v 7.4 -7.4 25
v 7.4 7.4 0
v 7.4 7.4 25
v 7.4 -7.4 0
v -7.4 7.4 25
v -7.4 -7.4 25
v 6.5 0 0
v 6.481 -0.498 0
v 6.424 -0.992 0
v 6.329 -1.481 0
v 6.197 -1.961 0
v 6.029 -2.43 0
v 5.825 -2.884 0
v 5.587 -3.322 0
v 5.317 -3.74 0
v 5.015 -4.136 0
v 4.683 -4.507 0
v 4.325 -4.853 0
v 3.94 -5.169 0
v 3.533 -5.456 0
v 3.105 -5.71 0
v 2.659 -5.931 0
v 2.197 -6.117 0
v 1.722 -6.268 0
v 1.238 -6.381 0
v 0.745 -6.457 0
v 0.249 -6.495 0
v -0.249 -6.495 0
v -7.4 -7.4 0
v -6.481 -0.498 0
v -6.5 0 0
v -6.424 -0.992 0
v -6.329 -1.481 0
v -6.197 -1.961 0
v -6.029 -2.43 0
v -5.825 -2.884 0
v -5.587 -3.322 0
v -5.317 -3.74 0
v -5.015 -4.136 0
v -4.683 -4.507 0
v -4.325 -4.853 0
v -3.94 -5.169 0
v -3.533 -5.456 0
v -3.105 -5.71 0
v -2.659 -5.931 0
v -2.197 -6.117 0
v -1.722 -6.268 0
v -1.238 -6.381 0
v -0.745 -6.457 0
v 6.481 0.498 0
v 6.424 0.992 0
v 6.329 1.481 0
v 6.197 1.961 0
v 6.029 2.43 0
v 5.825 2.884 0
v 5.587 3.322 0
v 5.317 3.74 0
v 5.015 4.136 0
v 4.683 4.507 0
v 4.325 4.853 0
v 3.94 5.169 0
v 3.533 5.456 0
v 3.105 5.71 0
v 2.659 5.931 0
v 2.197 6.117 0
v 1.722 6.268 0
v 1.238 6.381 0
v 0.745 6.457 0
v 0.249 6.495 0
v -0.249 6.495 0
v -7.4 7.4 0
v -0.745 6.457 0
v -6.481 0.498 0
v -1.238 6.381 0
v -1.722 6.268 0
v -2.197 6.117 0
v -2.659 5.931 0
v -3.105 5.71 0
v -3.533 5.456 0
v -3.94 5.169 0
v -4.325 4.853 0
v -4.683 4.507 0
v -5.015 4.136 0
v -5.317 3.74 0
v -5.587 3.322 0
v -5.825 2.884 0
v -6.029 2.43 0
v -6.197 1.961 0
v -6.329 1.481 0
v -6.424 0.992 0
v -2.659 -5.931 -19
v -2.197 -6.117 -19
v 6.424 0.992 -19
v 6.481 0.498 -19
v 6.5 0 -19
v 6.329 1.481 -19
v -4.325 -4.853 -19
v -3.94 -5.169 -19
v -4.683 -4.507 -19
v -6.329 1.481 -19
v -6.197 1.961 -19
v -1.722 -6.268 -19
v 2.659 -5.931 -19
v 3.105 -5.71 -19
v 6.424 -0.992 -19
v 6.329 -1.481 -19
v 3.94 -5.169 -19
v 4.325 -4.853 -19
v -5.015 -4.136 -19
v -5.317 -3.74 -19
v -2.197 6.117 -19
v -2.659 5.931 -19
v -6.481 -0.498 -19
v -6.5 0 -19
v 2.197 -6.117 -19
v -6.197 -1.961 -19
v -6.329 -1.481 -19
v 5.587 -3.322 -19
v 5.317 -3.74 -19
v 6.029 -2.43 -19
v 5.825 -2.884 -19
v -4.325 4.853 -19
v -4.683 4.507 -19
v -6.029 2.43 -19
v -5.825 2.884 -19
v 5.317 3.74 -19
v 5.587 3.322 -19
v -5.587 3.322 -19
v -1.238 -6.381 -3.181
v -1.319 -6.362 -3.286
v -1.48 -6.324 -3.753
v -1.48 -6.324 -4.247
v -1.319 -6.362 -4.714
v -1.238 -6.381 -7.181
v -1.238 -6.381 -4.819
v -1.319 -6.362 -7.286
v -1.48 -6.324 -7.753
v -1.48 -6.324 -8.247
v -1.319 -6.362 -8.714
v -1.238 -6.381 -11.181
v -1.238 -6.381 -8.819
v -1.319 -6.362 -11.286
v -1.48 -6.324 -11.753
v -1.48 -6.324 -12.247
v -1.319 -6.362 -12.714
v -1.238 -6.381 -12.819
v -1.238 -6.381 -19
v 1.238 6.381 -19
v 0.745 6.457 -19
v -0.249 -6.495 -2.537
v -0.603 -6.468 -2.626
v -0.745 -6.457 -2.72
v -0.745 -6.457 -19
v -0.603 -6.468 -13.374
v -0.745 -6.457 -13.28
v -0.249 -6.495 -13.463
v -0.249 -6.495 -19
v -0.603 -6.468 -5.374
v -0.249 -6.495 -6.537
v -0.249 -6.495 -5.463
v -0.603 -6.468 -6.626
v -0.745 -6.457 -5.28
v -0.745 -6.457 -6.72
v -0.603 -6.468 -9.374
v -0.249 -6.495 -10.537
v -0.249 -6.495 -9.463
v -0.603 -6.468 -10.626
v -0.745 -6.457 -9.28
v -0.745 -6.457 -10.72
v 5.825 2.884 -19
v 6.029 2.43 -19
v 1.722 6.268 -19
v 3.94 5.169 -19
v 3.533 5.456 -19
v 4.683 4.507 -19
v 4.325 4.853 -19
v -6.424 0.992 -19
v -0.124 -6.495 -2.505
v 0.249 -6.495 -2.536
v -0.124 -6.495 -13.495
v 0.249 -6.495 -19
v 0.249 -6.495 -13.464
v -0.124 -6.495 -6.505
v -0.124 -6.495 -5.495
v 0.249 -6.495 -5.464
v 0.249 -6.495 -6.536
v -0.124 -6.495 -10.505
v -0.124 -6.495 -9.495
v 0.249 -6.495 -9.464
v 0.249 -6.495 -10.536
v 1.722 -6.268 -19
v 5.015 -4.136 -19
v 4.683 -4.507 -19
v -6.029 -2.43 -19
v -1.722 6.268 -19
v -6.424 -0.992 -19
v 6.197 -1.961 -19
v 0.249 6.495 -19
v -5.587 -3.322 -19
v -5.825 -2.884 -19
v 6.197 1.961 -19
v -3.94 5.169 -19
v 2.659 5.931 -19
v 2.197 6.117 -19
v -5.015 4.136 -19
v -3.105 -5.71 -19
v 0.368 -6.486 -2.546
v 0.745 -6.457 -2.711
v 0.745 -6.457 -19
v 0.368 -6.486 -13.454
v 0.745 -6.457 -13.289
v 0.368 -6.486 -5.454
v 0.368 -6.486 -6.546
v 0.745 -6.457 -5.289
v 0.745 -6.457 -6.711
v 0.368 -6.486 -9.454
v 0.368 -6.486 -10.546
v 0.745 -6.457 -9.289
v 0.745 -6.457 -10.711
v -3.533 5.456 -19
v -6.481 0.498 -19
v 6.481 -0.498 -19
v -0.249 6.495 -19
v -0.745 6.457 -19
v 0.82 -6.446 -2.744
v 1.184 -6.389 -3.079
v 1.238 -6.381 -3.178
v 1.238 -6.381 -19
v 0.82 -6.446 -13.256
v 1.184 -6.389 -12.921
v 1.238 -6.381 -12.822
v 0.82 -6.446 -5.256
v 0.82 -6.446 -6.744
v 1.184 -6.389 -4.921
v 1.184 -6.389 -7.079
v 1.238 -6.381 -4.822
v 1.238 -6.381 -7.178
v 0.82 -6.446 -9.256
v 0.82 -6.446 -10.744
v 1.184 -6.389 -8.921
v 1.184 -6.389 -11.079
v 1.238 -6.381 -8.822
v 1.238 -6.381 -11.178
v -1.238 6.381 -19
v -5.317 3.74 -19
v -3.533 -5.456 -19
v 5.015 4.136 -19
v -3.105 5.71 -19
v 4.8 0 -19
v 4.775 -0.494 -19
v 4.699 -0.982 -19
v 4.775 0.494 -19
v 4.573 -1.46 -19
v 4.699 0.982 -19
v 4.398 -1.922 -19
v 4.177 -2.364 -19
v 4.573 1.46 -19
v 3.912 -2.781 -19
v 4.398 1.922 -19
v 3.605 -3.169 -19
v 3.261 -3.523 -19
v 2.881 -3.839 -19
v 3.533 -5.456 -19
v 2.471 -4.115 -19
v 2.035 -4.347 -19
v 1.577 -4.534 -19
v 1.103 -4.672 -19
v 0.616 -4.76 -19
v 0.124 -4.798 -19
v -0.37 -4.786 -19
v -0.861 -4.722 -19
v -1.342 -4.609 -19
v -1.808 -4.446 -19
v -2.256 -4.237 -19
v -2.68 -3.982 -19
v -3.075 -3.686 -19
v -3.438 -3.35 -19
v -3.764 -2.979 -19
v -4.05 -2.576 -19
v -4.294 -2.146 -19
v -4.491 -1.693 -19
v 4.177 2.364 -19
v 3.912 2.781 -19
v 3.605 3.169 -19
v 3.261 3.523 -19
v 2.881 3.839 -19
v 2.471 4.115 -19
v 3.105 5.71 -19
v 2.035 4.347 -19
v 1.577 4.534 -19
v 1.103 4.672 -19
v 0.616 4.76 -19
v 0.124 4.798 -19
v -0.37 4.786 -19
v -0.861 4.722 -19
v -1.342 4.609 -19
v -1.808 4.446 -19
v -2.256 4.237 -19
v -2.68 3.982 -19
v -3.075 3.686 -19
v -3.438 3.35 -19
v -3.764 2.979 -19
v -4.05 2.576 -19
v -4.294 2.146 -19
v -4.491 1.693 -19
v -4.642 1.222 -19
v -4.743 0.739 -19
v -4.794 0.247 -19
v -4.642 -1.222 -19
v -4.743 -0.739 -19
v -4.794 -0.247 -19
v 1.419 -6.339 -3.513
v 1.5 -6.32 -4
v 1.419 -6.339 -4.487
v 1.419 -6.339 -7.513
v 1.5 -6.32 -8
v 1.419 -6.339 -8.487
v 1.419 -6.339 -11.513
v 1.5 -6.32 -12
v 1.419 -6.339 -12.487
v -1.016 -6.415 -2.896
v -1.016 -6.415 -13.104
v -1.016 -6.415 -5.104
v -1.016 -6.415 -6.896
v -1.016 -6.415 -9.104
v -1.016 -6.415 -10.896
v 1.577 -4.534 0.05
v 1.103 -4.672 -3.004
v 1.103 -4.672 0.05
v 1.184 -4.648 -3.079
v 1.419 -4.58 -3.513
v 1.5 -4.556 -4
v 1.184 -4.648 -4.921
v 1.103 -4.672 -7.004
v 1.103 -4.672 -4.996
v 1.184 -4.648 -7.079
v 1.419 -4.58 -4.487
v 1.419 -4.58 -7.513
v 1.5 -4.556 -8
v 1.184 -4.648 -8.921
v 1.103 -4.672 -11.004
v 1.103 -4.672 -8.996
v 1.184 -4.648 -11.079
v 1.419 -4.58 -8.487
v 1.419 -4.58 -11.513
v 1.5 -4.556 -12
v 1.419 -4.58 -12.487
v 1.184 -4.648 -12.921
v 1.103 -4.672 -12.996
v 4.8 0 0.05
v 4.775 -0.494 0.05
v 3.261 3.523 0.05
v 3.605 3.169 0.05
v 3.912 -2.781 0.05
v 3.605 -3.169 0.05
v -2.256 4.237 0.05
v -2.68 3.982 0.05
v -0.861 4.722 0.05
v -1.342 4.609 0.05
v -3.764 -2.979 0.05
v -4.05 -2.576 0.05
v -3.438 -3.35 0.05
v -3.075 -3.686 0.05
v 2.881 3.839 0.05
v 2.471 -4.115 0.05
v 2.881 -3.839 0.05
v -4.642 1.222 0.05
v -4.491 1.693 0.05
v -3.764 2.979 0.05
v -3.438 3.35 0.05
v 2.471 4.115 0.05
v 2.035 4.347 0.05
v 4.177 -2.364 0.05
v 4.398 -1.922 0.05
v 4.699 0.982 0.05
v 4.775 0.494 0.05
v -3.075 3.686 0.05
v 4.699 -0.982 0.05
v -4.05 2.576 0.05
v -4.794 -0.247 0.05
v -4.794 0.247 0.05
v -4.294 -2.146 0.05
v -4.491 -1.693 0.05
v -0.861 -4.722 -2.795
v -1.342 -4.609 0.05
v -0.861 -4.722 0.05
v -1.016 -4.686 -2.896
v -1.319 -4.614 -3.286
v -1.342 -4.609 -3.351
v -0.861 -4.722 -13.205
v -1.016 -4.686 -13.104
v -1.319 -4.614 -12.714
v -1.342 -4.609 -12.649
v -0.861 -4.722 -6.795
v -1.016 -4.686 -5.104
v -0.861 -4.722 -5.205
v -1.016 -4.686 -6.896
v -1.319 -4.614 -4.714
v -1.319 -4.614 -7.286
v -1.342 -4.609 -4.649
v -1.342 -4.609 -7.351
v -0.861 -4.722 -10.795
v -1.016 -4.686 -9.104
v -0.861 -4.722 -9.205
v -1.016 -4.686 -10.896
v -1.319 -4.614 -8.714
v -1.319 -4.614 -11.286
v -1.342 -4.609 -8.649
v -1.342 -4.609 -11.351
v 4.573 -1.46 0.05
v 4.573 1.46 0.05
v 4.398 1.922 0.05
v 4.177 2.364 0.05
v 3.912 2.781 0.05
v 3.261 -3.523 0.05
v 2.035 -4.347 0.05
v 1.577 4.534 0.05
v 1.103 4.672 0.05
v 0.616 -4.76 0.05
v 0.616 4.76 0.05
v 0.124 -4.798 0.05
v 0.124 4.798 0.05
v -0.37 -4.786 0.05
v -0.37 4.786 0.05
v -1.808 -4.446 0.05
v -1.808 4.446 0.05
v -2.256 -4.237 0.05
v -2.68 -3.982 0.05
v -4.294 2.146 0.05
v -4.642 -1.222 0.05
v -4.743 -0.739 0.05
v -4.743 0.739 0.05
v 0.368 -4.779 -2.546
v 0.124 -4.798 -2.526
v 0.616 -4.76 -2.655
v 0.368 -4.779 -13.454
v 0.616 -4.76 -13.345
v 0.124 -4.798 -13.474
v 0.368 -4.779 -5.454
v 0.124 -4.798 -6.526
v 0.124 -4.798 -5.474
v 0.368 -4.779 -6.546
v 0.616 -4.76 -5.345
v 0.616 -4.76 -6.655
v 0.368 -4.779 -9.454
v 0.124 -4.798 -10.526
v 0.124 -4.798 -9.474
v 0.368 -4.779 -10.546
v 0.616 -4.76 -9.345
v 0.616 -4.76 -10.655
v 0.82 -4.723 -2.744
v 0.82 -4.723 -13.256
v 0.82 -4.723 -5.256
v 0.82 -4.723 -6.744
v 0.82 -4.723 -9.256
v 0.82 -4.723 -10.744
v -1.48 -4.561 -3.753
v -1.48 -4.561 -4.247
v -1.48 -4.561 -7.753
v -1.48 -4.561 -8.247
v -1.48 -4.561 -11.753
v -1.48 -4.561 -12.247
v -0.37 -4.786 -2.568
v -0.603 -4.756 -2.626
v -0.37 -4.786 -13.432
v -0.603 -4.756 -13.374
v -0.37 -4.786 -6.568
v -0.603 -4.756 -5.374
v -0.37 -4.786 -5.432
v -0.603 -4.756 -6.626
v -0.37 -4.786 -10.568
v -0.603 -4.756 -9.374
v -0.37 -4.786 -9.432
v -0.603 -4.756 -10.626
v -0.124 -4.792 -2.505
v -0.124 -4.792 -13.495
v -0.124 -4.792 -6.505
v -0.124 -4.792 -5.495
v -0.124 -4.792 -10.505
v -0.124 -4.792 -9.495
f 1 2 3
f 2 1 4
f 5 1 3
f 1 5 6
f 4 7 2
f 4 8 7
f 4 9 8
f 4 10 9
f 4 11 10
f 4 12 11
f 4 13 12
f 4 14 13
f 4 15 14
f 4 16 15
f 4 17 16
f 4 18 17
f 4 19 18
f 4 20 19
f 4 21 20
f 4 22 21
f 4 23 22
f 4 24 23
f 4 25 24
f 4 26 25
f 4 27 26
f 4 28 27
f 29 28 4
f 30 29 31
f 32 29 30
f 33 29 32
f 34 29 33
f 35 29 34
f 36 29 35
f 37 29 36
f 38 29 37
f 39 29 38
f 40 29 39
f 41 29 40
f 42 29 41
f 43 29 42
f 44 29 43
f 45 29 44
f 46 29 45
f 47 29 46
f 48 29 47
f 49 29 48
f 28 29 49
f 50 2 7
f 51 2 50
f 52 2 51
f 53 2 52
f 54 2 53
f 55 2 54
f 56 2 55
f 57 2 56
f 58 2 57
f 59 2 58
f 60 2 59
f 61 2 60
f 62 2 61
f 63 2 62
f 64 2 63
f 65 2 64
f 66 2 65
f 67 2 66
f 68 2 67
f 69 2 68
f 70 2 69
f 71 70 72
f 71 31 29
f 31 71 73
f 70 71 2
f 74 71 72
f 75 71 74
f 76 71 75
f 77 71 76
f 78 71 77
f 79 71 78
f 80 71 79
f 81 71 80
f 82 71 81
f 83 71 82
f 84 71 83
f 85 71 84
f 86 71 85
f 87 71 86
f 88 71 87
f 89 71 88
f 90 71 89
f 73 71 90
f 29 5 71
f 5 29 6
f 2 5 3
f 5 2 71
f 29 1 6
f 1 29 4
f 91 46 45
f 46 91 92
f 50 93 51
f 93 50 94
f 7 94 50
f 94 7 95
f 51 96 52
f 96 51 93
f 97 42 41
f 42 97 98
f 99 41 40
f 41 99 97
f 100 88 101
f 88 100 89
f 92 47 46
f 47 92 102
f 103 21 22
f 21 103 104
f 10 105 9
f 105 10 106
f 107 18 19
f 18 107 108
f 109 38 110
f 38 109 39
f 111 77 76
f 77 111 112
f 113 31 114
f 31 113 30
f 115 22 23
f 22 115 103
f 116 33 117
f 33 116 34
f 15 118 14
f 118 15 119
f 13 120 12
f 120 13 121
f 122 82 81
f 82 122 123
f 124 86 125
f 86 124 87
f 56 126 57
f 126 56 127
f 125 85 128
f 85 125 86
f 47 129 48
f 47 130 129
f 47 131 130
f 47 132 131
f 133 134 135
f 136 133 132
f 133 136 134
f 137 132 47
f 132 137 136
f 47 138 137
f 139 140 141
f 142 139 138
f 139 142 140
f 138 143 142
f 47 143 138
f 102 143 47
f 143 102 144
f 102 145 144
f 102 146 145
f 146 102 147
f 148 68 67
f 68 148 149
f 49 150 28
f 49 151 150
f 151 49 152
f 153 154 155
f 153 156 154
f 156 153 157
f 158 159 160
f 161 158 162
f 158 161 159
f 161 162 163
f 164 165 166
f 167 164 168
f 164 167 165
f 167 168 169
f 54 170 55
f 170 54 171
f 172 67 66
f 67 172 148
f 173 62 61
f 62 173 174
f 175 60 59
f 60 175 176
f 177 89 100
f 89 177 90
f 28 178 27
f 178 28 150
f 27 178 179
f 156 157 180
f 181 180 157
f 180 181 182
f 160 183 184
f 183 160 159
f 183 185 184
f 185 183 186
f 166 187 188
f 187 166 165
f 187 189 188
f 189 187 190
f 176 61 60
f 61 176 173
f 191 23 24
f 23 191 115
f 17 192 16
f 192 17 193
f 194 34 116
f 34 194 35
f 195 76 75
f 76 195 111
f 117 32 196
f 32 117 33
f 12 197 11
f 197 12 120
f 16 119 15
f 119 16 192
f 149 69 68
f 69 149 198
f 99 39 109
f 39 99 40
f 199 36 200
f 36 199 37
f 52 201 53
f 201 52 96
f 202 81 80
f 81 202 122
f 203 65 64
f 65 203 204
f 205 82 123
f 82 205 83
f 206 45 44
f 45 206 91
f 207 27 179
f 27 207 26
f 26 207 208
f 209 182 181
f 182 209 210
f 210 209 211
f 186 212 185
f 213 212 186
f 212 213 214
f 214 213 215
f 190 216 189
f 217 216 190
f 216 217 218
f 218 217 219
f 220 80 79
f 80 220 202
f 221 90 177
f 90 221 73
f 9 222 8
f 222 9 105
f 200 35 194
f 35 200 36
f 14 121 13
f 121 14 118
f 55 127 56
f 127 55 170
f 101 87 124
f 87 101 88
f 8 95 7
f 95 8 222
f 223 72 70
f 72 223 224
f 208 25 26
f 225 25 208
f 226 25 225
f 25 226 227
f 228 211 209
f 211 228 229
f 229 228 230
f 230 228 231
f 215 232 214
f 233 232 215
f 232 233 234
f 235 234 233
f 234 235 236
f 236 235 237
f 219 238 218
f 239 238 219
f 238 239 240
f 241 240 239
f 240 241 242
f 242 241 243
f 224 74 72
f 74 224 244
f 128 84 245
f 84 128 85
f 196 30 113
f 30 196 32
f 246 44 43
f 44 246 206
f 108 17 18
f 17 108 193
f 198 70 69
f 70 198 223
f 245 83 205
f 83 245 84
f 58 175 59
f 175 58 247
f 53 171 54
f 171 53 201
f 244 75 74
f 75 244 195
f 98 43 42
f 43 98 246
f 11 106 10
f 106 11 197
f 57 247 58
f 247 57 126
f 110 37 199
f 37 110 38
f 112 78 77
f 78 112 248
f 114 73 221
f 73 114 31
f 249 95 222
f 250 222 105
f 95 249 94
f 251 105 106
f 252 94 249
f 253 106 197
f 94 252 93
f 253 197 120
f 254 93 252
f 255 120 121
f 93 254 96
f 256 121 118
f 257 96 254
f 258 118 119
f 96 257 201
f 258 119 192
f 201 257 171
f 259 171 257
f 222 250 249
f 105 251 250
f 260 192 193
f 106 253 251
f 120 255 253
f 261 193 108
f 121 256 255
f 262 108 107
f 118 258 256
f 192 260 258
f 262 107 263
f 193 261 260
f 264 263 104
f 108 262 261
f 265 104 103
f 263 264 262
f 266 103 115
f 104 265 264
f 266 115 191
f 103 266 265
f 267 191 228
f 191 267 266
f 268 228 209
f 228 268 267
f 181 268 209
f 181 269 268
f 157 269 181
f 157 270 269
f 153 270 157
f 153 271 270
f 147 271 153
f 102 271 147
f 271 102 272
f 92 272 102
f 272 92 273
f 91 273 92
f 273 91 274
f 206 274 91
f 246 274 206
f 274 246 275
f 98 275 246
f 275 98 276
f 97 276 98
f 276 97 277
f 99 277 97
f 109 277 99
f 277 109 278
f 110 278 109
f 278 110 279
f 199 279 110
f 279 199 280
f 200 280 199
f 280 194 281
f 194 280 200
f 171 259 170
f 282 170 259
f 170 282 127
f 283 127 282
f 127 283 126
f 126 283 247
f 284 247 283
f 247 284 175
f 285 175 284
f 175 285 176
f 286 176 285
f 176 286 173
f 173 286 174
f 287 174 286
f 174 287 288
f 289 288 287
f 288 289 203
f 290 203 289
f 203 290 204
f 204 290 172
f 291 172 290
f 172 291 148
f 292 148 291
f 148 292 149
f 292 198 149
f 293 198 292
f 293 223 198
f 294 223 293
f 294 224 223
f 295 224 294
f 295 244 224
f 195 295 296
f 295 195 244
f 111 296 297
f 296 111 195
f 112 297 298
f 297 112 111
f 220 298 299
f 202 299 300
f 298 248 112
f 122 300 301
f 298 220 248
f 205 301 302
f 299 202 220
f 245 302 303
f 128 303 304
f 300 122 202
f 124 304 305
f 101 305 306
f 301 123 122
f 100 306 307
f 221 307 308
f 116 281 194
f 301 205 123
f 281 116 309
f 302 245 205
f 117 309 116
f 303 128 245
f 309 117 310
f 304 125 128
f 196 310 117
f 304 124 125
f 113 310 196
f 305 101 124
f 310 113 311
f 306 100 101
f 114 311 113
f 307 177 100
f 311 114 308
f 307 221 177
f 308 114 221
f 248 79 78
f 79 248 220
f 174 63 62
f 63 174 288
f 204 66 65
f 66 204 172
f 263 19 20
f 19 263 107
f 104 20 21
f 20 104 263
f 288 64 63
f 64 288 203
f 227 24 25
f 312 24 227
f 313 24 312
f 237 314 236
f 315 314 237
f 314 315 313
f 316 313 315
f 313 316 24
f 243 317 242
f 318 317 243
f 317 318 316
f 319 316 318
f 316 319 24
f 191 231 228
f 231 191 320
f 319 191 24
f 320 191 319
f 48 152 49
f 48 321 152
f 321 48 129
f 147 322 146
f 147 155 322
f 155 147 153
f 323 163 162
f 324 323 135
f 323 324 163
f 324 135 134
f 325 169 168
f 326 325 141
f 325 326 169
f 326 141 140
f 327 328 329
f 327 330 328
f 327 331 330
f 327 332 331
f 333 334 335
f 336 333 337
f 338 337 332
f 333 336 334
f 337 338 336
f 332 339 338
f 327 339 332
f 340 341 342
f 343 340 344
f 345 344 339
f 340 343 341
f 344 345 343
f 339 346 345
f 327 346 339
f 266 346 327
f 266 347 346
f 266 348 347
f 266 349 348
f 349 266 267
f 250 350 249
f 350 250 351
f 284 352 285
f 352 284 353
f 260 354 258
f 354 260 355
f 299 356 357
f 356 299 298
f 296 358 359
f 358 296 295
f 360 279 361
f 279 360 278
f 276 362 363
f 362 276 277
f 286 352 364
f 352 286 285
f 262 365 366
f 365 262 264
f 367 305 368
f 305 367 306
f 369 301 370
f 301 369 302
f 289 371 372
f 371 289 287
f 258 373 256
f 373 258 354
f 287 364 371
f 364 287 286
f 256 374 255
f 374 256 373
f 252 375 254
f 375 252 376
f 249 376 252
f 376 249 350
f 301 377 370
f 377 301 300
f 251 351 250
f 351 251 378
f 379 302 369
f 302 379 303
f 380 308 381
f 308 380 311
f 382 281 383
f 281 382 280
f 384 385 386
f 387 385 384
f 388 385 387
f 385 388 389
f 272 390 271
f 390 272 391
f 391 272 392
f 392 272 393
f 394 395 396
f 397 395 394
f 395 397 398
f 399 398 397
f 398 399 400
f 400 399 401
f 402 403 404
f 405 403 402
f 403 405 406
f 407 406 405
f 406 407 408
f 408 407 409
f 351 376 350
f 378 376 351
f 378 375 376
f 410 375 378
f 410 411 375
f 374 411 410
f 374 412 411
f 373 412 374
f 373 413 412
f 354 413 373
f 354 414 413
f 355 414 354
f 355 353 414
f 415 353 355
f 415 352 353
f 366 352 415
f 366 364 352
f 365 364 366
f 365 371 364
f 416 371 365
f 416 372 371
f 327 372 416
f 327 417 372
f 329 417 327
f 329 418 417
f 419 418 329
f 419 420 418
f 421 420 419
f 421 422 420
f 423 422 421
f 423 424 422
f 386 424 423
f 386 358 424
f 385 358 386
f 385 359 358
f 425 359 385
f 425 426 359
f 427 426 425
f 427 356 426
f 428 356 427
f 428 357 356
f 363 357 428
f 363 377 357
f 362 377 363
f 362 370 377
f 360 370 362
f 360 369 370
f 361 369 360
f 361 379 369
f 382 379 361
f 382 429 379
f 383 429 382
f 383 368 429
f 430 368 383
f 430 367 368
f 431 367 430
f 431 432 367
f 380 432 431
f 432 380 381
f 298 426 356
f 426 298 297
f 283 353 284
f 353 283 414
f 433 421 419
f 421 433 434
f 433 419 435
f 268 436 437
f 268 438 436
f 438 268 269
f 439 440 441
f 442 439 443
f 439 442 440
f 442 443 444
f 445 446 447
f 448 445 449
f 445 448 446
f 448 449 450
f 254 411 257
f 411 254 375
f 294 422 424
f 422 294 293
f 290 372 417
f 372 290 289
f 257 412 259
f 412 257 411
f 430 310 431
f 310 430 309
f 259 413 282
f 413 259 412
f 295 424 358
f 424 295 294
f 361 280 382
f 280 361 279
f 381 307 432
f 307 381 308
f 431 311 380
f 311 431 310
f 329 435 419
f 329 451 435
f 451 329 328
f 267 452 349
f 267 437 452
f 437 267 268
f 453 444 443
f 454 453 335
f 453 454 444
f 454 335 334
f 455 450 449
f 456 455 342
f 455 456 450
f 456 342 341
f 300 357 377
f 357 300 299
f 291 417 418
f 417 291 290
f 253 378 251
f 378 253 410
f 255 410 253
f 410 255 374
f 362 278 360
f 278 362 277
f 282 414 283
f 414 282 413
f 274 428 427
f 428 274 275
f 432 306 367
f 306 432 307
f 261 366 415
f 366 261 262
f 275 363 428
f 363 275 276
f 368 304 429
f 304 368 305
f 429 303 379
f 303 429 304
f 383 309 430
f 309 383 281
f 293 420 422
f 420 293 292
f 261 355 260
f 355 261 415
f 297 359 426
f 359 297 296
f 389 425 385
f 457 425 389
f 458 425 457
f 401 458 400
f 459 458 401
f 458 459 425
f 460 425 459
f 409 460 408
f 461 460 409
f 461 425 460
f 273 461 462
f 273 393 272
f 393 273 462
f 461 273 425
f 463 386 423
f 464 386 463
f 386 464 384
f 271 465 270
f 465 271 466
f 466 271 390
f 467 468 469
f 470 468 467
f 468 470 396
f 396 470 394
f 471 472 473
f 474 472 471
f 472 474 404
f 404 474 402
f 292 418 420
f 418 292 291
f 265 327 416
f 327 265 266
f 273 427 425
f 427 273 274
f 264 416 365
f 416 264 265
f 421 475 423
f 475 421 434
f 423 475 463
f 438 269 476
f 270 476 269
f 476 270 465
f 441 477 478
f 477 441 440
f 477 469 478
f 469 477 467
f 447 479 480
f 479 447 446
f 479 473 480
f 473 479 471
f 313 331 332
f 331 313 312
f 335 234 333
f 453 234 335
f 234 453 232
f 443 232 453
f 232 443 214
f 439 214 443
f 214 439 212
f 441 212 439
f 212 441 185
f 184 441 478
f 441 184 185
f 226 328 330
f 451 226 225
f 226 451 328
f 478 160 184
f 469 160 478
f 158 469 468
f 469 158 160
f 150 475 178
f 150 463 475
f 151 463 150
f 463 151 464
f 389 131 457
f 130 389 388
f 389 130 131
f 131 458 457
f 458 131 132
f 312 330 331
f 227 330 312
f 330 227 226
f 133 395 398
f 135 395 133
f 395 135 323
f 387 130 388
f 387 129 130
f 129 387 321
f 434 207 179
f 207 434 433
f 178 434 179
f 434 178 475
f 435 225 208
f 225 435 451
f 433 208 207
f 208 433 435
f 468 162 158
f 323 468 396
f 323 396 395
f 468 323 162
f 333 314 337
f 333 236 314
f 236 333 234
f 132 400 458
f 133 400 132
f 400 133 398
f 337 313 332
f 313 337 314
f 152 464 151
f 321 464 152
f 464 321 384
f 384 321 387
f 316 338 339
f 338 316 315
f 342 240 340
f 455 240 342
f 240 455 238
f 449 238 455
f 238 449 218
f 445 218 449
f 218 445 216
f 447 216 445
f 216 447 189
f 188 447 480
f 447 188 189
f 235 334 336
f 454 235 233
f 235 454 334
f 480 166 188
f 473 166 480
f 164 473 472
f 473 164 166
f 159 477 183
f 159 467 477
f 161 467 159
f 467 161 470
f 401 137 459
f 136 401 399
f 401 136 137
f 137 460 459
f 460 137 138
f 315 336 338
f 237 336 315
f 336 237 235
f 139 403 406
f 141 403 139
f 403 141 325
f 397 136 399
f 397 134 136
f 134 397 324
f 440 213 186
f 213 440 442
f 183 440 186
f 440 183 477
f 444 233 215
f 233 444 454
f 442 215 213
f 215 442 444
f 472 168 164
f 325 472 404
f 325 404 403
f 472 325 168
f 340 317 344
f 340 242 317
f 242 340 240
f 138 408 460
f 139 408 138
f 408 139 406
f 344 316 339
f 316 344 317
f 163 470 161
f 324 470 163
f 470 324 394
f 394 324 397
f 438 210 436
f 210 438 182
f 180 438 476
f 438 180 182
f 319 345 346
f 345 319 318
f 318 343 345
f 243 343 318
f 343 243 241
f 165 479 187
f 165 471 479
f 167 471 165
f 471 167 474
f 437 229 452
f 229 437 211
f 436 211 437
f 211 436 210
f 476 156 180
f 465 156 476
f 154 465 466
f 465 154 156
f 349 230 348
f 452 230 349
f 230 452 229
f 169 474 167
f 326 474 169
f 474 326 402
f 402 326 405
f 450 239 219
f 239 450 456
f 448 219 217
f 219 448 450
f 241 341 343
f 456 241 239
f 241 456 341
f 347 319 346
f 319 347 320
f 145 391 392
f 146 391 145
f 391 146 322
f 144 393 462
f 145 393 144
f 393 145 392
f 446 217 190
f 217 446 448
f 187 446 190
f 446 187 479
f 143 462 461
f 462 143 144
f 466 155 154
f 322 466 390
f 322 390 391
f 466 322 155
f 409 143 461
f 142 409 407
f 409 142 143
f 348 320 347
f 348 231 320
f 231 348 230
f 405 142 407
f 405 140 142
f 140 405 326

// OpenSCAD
$fa=0.5; // default minimum facet angle is now 0.5
$fs=0.5; // default minimum facet size is now 0.5 mm

difference() {
    union() {
        //main body
        translate([0, 0, 25/2]) 
        cube([14.8, 14.8, 25], center = true);
        
        //central cylinder
        translate([0, 0, -19/2])
        cylinder(h = 19, r = 13/2, center = true);  
    }
    
    //central cylinder
    translate([0, 0, -19/2])
    cylinder(h = 19.1, r = 9.6/2, center = true); 
    
    //set screws
    rotate([90, 0, 0])
    translate([0, -4, 4])
    cylinder(h = 13, r = 1.5, center = true); 
    
    rotate([90, 0, 0])
    translate([0, -8, 4])
    cylinder(h = 13, r = 1.5, center = true); 
    
    rotate([90, 0, 0])
    translate([0, -12, 4])
    cylinder(h = 13, r = 1.5, center = true); 
}
